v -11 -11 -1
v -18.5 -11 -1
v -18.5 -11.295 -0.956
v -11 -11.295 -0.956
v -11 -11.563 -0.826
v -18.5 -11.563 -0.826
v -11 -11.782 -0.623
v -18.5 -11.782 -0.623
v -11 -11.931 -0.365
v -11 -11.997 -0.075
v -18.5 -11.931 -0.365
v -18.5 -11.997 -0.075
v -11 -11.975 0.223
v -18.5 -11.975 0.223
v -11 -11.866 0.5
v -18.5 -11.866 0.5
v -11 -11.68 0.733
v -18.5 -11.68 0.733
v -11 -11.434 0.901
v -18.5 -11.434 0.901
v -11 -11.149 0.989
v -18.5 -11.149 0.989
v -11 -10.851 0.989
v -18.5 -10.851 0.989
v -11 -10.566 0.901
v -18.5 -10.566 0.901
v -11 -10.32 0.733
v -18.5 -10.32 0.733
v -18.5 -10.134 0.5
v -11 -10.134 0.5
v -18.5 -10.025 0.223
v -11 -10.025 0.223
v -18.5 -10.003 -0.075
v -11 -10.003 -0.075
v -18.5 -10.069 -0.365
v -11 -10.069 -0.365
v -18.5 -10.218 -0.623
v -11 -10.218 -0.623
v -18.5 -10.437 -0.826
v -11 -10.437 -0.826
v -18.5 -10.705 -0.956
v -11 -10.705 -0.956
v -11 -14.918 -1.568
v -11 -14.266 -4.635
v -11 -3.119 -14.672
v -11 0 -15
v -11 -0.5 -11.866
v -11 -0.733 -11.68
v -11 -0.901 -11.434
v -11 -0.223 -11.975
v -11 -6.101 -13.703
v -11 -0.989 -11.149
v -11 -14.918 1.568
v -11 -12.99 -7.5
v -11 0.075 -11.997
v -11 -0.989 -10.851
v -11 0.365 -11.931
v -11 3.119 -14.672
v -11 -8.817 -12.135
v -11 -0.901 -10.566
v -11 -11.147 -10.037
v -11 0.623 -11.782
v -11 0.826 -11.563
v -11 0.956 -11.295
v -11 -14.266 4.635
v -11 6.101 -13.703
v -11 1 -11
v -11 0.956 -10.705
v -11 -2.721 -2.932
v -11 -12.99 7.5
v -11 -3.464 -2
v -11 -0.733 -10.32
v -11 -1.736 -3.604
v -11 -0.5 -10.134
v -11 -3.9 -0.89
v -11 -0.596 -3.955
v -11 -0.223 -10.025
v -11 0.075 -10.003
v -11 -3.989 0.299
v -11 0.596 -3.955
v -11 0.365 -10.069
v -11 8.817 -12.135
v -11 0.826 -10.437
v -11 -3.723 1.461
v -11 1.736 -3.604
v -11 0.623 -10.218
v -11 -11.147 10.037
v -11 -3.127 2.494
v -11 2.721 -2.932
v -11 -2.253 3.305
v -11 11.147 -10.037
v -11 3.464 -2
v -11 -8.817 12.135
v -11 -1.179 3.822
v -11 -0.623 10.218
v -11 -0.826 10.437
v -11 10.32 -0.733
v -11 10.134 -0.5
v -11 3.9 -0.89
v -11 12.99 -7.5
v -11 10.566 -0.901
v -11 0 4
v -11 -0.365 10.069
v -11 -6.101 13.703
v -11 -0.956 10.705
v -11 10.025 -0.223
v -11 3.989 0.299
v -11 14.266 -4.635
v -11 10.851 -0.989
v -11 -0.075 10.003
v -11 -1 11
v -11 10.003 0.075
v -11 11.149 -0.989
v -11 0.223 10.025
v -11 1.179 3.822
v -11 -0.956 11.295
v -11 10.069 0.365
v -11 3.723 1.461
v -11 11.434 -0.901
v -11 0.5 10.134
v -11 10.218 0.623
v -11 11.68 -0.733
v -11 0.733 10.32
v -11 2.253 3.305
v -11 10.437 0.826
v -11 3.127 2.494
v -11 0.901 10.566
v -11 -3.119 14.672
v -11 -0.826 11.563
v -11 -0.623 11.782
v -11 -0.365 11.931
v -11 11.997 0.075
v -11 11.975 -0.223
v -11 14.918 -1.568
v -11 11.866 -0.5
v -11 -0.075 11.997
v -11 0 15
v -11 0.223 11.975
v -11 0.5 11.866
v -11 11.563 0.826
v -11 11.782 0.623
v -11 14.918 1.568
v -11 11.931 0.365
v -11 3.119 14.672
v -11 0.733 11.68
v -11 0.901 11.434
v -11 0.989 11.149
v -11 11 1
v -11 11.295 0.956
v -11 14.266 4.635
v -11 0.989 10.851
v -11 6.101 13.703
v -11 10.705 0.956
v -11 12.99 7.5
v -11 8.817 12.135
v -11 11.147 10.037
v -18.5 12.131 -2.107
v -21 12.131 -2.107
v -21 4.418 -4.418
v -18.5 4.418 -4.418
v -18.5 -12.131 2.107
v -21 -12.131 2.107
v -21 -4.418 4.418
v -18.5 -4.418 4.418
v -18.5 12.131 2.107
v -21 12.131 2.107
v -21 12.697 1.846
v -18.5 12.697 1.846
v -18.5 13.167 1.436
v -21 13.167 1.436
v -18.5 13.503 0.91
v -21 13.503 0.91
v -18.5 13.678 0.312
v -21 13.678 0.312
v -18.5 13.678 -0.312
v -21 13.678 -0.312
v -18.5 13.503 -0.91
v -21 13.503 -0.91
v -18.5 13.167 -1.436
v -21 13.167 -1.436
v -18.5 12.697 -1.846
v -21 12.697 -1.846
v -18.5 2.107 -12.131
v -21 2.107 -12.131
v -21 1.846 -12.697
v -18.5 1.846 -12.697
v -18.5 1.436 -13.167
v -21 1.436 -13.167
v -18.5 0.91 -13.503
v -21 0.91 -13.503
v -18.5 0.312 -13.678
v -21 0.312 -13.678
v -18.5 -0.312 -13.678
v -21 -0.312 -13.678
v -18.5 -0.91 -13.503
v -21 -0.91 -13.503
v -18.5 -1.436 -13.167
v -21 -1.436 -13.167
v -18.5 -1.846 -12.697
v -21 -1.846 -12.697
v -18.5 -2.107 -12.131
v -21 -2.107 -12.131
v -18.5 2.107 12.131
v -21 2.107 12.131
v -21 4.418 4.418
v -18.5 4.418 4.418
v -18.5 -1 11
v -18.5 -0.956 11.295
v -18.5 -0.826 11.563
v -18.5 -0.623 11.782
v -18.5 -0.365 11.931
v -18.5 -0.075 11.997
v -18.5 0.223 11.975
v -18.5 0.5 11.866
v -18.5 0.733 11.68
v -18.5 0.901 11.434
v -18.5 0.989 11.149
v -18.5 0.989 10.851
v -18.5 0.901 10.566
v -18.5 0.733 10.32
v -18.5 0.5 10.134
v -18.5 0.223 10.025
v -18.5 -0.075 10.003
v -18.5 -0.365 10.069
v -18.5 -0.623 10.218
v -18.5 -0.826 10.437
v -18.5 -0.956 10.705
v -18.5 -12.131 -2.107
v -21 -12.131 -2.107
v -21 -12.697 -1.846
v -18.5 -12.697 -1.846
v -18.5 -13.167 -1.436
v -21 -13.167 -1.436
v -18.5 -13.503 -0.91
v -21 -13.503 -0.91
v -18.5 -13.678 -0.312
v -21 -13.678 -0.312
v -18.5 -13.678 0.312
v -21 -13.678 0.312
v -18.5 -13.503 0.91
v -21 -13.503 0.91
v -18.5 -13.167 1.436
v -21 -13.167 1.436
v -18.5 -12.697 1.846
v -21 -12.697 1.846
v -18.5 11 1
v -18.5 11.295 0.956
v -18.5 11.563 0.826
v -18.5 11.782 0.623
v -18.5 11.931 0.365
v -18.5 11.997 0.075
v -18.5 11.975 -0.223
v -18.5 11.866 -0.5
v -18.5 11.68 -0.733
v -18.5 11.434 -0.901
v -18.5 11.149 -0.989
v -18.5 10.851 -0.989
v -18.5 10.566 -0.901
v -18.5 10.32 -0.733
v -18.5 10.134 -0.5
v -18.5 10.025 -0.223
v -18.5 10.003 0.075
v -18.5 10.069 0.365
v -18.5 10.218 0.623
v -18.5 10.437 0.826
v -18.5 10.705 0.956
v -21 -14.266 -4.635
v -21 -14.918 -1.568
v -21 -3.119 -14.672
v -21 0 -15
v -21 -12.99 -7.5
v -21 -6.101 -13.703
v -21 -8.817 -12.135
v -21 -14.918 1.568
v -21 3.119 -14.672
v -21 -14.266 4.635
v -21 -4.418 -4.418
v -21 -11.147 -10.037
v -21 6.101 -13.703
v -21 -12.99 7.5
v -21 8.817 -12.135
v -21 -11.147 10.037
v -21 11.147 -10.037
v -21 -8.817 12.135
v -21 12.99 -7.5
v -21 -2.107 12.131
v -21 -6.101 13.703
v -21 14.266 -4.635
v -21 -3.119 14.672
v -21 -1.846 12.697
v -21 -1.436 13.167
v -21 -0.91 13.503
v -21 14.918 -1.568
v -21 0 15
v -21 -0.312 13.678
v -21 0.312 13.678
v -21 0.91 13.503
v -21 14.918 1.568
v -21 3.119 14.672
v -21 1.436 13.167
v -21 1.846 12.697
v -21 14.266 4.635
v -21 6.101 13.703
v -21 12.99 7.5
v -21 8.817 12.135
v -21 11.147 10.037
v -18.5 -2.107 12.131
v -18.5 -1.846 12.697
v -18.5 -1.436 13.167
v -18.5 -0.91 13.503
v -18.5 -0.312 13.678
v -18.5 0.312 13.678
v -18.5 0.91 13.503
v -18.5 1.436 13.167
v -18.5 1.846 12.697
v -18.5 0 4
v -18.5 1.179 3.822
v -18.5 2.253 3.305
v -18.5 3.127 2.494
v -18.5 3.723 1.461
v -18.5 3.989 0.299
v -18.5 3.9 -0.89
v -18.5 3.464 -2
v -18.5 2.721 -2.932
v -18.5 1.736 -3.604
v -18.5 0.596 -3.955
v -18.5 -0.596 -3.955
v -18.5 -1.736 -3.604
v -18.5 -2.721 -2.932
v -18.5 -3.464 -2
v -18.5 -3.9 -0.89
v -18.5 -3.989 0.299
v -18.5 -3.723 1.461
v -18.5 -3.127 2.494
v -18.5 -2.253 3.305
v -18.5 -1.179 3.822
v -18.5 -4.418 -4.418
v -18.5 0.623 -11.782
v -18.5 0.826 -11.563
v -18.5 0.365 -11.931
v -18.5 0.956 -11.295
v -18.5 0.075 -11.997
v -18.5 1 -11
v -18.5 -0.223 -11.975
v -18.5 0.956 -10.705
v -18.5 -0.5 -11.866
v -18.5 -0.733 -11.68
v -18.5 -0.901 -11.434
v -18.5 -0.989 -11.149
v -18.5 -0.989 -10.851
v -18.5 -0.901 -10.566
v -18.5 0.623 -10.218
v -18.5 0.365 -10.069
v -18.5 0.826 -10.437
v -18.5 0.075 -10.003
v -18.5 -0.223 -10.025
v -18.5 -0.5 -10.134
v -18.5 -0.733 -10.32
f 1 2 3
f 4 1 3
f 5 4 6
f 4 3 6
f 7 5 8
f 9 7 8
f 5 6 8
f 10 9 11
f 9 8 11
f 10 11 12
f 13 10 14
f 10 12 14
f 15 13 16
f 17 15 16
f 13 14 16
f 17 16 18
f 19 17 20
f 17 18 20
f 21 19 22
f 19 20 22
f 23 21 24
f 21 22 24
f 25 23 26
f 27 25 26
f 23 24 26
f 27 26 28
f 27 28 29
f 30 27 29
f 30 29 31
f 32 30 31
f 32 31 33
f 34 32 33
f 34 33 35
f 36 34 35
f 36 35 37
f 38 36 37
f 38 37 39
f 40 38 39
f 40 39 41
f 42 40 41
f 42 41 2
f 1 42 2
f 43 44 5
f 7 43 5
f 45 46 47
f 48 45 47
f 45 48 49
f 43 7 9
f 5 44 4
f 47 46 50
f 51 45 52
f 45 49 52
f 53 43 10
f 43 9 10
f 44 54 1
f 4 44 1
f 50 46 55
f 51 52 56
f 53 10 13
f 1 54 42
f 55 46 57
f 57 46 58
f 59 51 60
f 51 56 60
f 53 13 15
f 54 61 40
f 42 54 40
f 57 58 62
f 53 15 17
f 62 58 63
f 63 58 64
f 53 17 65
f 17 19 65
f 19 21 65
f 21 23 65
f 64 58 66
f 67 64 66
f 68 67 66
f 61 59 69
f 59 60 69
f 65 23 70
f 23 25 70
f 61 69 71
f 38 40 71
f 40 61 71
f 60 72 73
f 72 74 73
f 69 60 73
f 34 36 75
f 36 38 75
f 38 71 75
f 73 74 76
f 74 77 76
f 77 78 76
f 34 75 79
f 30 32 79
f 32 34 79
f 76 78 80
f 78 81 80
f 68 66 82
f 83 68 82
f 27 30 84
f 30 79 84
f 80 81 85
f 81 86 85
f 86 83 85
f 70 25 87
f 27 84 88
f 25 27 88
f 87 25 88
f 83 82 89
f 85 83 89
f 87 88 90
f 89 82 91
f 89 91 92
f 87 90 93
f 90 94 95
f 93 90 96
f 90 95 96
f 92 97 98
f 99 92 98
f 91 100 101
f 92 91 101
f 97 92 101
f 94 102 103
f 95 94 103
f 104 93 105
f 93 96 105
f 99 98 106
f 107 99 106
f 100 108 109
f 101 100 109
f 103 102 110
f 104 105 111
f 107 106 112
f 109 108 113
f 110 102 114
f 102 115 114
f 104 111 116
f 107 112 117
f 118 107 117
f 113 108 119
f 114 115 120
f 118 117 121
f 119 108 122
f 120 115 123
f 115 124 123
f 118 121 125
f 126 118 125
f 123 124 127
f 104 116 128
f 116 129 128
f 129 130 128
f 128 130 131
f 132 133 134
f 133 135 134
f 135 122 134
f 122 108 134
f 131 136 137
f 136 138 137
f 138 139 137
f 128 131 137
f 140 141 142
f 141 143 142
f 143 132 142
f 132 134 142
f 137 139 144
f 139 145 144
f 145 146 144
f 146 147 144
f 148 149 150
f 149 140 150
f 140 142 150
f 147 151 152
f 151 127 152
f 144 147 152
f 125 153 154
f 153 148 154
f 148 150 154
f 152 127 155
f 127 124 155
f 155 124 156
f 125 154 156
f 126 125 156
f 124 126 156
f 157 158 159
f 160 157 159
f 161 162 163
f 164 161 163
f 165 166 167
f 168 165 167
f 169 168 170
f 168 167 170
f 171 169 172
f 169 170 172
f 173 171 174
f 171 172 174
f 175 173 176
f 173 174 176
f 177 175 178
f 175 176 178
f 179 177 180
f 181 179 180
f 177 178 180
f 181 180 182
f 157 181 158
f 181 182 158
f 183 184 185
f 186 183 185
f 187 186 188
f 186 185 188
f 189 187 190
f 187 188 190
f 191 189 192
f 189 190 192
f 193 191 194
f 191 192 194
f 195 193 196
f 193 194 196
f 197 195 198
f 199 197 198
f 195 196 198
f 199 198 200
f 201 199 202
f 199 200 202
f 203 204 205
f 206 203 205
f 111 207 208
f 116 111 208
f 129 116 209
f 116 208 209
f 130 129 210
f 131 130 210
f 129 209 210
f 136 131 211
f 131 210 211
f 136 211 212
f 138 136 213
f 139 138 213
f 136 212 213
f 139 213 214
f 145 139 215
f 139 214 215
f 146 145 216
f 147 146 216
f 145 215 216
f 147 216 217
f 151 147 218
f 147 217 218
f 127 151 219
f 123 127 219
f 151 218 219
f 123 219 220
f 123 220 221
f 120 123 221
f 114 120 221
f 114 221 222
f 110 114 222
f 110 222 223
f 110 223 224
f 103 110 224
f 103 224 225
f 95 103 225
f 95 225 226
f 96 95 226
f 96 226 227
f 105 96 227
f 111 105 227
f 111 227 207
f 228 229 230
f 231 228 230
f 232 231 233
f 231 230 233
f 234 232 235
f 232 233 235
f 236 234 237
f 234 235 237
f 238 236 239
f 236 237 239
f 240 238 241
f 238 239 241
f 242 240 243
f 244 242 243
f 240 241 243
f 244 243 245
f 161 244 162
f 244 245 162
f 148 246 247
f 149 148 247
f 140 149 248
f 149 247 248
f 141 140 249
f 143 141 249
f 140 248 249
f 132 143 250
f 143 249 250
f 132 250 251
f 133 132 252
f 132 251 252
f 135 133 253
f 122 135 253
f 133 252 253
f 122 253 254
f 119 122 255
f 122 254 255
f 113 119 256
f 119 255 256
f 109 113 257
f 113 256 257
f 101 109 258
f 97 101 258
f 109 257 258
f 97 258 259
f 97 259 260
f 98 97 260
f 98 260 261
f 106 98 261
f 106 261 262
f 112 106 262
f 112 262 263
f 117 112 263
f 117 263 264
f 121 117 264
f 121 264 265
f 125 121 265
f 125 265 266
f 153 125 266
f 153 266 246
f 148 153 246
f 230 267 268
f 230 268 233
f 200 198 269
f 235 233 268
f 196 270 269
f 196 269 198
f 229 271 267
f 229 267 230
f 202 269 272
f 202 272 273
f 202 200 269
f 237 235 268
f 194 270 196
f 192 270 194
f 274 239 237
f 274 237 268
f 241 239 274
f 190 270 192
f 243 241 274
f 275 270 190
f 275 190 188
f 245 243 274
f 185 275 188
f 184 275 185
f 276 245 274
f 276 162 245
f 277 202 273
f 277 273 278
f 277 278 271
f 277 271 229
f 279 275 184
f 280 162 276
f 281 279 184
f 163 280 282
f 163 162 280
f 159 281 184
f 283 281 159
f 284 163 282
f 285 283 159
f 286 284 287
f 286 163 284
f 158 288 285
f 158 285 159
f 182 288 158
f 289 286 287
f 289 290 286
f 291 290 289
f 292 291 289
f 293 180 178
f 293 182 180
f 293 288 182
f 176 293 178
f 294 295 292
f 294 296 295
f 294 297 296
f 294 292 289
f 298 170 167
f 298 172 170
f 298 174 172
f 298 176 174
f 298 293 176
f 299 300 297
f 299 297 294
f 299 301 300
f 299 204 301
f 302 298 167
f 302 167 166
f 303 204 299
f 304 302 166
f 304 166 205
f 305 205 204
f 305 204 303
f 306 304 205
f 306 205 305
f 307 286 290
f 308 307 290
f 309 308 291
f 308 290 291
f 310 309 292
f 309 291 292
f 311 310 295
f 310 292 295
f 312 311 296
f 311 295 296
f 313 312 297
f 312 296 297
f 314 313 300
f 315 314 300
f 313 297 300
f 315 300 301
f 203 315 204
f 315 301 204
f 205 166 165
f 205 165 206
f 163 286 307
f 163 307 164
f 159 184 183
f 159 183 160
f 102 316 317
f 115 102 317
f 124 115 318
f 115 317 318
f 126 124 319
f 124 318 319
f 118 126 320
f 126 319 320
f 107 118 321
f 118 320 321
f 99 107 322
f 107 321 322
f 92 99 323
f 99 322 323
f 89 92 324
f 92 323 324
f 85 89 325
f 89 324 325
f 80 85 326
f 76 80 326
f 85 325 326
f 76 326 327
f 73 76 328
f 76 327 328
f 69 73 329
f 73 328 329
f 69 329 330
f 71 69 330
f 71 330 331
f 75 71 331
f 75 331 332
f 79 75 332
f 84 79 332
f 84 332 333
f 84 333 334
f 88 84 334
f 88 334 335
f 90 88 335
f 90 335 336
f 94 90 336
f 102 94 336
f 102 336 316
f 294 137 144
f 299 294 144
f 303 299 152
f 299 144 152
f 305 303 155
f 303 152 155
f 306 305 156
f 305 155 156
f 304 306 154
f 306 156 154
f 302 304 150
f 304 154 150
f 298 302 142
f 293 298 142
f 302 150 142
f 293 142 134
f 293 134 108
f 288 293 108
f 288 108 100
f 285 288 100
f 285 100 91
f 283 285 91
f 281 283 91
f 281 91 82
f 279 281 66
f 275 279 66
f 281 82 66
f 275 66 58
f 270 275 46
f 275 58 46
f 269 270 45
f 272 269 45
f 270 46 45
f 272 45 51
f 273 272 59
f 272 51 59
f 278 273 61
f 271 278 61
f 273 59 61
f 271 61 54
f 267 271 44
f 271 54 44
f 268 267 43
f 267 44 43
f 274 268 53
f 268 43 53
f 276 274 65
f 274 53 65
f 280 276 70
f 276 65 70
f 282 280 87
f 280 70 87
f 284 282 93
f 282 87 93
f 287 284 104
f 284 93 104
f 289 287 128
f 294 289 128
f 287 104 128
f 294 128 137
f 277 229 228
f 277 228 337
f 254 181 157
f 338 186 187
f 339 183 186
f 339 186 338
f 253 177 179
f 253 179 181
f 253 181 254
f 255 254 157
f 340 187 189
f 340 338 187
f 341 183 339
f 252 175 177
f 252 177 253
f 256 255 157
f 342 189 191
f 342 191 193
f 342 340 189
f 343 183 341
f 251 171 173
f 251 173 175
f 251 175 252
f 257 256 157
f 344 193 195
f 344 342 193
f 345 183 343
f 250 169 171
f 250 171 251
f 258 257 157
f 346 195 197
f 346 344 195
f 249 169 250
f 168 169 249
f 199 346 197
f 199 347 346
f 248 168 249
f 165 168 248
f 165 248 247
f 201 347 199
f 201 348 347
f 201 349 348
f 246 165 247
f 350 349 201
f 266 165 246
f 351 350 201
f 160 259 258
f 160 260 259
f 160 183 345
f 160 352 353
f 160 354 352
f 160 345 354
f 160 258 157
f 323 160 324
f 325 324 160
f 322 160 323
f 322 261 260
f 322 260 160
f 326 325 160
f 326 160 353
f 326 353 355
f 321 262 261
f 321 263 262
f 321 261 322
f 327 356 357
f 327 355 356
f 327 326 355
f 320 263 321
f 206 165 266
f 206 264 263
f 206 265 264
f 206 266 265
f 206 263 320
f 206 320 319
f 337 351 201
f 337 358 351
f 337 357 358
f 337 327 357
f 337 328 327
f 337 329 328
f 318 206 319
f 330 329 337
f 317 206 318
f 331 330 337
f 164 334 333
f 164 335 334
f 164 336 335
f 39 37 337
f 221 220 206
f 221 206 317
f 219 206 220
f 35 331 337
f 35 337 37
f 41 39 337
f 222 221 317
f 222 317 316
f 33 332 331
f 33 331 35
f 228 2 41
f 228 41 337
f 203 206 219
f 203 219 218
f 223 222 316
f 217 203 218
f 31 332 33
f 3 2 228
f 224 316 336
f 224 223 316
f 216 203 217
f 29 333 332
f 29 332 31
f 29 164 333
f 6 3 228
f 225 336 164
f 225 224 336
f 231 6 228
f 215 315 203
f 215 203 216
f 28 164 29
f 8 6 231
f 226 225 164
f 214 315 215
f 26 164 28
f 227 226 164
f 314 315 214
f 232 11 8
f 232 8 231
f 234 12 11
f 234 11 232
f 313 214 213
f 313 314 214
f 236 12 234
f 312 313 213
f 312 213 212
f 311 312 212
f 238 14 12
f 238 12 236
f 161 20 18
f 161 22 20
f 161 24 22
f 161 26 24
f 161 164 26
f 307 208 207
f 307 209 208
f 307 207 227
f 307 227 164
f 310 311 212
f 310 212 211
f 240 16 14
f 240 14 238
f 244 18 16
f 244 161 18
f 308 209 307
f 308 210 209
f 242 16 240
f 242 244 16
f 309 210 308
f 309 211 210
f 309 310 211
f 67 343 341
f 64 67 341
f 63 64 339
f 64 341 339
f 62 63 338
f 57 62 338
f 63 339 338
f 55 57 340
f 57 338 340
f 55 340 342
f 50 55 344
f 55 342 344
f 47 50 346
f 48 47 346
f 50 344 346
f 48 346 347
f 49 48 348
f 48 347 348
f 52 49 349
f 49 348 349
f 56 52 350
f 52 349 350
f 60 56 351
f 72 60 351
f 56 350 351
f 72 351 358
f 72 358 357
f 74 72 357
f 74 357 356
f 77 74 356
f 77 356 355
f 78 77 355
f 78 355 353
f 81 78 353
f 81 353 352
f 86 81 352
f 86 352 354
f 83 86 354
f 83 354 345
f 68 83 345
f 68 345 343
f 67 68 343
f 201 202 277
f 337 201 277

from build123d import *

# Parameters (mm, degrees)
SKETCH013_R             = 15
PAD008_DEPTH            = 10
POCKET002_DEPTH         = 2.5
POLARPATTERN_COUNT      = 4
SKETCH010_R             = 1
HOLE_DEPTH              = 25
POLARPATTERN001_COUNT   = 4
SKETCH011_R             = 4
POCKET001_DEPTH         = 7.501
BODY009_PLACEMENT_ANGLE = 90


with BuildPart() as part:
    # Sketch013 → Pad008 (new body)
    with BuildSketch(Plane.XY):
        Circle(SKETCH013_R)
    extrude(amount=PAD008_DEPTH)

    # Sketch012 (on Face3 of Pad008) → Pocket002 (cut)
    with BuildSketch(Plane.XY.offset(10)):
        with BuildLine():
            ThreePointArc((-5.26869, 1.578261), (0, -5.5), (5.26869, 1.578261))
            Line((2.107476, 12.131304), (5.26869, 1.578261))
            ThreePointArc((2.107476, 12.131304), (0, 13.7), (-2.107476, 12.131304))
            Line((-2.107476, 12.131304), (-5.26869, 1.578261))
        make_face()
    pocket002 = extrude(amount=-POCKET002_DEPTH, mode=Mode.SUBTRACT)

    # PolarPattern: Pocket002 ×4 about axis
    polarpattern_axis = Axis((0, 0, 10), (0, 0, 1))
    for i in range(1, POLARPATTERN_COUNT):
        add(pocket002.rotate(polarpattern_axis, i * 360 / POLARPATTERN_COUNT), mode=Mode.SUBTRACT)

    # Sketch010 (on Face21 of PolarPattern) → Hole (cut)
    with BuildSketch(Plane.XY.offset(7.5)):
        with Locations((0, 11)):
            Circle(SKETCH010_R)
    hole = extrude(amount=-HOLE_DEPTH, mode=Mode.SUBTRACT)

    # PolarPattern001: Hole ×4 about axis
    polarpattern001_axis = Axis((0, 0, 7.5), (0, 0, 1))
    for i in range(1, POLARPATTERN001_COUNT):
        add(hole.rotate(polarpattern001_axis, i * 360 / POLARPATTERN001_COUNT), mode=Mode.SUBTRACT)

    # Sketch011 (on Face25 of PolarPattern001) → Pocket001 (cut, through all)
    with BuildSketch(Plane.XY.offset(7.5)):
        Circle(SKETCH011_R)
    extrude(amount=-POCKET001_DEPTH, mode=Mode.SUBTRACT)


with BuildPart() as part_1:
    # Body009 placement: moved
    add(part.part.moved(Location((-11, 0, 0))).rotate(Axis((-11, 0, 0), (0, -1, 0)), BODY009_PLACEMENT_ANGLE))


solid = part_1.part
